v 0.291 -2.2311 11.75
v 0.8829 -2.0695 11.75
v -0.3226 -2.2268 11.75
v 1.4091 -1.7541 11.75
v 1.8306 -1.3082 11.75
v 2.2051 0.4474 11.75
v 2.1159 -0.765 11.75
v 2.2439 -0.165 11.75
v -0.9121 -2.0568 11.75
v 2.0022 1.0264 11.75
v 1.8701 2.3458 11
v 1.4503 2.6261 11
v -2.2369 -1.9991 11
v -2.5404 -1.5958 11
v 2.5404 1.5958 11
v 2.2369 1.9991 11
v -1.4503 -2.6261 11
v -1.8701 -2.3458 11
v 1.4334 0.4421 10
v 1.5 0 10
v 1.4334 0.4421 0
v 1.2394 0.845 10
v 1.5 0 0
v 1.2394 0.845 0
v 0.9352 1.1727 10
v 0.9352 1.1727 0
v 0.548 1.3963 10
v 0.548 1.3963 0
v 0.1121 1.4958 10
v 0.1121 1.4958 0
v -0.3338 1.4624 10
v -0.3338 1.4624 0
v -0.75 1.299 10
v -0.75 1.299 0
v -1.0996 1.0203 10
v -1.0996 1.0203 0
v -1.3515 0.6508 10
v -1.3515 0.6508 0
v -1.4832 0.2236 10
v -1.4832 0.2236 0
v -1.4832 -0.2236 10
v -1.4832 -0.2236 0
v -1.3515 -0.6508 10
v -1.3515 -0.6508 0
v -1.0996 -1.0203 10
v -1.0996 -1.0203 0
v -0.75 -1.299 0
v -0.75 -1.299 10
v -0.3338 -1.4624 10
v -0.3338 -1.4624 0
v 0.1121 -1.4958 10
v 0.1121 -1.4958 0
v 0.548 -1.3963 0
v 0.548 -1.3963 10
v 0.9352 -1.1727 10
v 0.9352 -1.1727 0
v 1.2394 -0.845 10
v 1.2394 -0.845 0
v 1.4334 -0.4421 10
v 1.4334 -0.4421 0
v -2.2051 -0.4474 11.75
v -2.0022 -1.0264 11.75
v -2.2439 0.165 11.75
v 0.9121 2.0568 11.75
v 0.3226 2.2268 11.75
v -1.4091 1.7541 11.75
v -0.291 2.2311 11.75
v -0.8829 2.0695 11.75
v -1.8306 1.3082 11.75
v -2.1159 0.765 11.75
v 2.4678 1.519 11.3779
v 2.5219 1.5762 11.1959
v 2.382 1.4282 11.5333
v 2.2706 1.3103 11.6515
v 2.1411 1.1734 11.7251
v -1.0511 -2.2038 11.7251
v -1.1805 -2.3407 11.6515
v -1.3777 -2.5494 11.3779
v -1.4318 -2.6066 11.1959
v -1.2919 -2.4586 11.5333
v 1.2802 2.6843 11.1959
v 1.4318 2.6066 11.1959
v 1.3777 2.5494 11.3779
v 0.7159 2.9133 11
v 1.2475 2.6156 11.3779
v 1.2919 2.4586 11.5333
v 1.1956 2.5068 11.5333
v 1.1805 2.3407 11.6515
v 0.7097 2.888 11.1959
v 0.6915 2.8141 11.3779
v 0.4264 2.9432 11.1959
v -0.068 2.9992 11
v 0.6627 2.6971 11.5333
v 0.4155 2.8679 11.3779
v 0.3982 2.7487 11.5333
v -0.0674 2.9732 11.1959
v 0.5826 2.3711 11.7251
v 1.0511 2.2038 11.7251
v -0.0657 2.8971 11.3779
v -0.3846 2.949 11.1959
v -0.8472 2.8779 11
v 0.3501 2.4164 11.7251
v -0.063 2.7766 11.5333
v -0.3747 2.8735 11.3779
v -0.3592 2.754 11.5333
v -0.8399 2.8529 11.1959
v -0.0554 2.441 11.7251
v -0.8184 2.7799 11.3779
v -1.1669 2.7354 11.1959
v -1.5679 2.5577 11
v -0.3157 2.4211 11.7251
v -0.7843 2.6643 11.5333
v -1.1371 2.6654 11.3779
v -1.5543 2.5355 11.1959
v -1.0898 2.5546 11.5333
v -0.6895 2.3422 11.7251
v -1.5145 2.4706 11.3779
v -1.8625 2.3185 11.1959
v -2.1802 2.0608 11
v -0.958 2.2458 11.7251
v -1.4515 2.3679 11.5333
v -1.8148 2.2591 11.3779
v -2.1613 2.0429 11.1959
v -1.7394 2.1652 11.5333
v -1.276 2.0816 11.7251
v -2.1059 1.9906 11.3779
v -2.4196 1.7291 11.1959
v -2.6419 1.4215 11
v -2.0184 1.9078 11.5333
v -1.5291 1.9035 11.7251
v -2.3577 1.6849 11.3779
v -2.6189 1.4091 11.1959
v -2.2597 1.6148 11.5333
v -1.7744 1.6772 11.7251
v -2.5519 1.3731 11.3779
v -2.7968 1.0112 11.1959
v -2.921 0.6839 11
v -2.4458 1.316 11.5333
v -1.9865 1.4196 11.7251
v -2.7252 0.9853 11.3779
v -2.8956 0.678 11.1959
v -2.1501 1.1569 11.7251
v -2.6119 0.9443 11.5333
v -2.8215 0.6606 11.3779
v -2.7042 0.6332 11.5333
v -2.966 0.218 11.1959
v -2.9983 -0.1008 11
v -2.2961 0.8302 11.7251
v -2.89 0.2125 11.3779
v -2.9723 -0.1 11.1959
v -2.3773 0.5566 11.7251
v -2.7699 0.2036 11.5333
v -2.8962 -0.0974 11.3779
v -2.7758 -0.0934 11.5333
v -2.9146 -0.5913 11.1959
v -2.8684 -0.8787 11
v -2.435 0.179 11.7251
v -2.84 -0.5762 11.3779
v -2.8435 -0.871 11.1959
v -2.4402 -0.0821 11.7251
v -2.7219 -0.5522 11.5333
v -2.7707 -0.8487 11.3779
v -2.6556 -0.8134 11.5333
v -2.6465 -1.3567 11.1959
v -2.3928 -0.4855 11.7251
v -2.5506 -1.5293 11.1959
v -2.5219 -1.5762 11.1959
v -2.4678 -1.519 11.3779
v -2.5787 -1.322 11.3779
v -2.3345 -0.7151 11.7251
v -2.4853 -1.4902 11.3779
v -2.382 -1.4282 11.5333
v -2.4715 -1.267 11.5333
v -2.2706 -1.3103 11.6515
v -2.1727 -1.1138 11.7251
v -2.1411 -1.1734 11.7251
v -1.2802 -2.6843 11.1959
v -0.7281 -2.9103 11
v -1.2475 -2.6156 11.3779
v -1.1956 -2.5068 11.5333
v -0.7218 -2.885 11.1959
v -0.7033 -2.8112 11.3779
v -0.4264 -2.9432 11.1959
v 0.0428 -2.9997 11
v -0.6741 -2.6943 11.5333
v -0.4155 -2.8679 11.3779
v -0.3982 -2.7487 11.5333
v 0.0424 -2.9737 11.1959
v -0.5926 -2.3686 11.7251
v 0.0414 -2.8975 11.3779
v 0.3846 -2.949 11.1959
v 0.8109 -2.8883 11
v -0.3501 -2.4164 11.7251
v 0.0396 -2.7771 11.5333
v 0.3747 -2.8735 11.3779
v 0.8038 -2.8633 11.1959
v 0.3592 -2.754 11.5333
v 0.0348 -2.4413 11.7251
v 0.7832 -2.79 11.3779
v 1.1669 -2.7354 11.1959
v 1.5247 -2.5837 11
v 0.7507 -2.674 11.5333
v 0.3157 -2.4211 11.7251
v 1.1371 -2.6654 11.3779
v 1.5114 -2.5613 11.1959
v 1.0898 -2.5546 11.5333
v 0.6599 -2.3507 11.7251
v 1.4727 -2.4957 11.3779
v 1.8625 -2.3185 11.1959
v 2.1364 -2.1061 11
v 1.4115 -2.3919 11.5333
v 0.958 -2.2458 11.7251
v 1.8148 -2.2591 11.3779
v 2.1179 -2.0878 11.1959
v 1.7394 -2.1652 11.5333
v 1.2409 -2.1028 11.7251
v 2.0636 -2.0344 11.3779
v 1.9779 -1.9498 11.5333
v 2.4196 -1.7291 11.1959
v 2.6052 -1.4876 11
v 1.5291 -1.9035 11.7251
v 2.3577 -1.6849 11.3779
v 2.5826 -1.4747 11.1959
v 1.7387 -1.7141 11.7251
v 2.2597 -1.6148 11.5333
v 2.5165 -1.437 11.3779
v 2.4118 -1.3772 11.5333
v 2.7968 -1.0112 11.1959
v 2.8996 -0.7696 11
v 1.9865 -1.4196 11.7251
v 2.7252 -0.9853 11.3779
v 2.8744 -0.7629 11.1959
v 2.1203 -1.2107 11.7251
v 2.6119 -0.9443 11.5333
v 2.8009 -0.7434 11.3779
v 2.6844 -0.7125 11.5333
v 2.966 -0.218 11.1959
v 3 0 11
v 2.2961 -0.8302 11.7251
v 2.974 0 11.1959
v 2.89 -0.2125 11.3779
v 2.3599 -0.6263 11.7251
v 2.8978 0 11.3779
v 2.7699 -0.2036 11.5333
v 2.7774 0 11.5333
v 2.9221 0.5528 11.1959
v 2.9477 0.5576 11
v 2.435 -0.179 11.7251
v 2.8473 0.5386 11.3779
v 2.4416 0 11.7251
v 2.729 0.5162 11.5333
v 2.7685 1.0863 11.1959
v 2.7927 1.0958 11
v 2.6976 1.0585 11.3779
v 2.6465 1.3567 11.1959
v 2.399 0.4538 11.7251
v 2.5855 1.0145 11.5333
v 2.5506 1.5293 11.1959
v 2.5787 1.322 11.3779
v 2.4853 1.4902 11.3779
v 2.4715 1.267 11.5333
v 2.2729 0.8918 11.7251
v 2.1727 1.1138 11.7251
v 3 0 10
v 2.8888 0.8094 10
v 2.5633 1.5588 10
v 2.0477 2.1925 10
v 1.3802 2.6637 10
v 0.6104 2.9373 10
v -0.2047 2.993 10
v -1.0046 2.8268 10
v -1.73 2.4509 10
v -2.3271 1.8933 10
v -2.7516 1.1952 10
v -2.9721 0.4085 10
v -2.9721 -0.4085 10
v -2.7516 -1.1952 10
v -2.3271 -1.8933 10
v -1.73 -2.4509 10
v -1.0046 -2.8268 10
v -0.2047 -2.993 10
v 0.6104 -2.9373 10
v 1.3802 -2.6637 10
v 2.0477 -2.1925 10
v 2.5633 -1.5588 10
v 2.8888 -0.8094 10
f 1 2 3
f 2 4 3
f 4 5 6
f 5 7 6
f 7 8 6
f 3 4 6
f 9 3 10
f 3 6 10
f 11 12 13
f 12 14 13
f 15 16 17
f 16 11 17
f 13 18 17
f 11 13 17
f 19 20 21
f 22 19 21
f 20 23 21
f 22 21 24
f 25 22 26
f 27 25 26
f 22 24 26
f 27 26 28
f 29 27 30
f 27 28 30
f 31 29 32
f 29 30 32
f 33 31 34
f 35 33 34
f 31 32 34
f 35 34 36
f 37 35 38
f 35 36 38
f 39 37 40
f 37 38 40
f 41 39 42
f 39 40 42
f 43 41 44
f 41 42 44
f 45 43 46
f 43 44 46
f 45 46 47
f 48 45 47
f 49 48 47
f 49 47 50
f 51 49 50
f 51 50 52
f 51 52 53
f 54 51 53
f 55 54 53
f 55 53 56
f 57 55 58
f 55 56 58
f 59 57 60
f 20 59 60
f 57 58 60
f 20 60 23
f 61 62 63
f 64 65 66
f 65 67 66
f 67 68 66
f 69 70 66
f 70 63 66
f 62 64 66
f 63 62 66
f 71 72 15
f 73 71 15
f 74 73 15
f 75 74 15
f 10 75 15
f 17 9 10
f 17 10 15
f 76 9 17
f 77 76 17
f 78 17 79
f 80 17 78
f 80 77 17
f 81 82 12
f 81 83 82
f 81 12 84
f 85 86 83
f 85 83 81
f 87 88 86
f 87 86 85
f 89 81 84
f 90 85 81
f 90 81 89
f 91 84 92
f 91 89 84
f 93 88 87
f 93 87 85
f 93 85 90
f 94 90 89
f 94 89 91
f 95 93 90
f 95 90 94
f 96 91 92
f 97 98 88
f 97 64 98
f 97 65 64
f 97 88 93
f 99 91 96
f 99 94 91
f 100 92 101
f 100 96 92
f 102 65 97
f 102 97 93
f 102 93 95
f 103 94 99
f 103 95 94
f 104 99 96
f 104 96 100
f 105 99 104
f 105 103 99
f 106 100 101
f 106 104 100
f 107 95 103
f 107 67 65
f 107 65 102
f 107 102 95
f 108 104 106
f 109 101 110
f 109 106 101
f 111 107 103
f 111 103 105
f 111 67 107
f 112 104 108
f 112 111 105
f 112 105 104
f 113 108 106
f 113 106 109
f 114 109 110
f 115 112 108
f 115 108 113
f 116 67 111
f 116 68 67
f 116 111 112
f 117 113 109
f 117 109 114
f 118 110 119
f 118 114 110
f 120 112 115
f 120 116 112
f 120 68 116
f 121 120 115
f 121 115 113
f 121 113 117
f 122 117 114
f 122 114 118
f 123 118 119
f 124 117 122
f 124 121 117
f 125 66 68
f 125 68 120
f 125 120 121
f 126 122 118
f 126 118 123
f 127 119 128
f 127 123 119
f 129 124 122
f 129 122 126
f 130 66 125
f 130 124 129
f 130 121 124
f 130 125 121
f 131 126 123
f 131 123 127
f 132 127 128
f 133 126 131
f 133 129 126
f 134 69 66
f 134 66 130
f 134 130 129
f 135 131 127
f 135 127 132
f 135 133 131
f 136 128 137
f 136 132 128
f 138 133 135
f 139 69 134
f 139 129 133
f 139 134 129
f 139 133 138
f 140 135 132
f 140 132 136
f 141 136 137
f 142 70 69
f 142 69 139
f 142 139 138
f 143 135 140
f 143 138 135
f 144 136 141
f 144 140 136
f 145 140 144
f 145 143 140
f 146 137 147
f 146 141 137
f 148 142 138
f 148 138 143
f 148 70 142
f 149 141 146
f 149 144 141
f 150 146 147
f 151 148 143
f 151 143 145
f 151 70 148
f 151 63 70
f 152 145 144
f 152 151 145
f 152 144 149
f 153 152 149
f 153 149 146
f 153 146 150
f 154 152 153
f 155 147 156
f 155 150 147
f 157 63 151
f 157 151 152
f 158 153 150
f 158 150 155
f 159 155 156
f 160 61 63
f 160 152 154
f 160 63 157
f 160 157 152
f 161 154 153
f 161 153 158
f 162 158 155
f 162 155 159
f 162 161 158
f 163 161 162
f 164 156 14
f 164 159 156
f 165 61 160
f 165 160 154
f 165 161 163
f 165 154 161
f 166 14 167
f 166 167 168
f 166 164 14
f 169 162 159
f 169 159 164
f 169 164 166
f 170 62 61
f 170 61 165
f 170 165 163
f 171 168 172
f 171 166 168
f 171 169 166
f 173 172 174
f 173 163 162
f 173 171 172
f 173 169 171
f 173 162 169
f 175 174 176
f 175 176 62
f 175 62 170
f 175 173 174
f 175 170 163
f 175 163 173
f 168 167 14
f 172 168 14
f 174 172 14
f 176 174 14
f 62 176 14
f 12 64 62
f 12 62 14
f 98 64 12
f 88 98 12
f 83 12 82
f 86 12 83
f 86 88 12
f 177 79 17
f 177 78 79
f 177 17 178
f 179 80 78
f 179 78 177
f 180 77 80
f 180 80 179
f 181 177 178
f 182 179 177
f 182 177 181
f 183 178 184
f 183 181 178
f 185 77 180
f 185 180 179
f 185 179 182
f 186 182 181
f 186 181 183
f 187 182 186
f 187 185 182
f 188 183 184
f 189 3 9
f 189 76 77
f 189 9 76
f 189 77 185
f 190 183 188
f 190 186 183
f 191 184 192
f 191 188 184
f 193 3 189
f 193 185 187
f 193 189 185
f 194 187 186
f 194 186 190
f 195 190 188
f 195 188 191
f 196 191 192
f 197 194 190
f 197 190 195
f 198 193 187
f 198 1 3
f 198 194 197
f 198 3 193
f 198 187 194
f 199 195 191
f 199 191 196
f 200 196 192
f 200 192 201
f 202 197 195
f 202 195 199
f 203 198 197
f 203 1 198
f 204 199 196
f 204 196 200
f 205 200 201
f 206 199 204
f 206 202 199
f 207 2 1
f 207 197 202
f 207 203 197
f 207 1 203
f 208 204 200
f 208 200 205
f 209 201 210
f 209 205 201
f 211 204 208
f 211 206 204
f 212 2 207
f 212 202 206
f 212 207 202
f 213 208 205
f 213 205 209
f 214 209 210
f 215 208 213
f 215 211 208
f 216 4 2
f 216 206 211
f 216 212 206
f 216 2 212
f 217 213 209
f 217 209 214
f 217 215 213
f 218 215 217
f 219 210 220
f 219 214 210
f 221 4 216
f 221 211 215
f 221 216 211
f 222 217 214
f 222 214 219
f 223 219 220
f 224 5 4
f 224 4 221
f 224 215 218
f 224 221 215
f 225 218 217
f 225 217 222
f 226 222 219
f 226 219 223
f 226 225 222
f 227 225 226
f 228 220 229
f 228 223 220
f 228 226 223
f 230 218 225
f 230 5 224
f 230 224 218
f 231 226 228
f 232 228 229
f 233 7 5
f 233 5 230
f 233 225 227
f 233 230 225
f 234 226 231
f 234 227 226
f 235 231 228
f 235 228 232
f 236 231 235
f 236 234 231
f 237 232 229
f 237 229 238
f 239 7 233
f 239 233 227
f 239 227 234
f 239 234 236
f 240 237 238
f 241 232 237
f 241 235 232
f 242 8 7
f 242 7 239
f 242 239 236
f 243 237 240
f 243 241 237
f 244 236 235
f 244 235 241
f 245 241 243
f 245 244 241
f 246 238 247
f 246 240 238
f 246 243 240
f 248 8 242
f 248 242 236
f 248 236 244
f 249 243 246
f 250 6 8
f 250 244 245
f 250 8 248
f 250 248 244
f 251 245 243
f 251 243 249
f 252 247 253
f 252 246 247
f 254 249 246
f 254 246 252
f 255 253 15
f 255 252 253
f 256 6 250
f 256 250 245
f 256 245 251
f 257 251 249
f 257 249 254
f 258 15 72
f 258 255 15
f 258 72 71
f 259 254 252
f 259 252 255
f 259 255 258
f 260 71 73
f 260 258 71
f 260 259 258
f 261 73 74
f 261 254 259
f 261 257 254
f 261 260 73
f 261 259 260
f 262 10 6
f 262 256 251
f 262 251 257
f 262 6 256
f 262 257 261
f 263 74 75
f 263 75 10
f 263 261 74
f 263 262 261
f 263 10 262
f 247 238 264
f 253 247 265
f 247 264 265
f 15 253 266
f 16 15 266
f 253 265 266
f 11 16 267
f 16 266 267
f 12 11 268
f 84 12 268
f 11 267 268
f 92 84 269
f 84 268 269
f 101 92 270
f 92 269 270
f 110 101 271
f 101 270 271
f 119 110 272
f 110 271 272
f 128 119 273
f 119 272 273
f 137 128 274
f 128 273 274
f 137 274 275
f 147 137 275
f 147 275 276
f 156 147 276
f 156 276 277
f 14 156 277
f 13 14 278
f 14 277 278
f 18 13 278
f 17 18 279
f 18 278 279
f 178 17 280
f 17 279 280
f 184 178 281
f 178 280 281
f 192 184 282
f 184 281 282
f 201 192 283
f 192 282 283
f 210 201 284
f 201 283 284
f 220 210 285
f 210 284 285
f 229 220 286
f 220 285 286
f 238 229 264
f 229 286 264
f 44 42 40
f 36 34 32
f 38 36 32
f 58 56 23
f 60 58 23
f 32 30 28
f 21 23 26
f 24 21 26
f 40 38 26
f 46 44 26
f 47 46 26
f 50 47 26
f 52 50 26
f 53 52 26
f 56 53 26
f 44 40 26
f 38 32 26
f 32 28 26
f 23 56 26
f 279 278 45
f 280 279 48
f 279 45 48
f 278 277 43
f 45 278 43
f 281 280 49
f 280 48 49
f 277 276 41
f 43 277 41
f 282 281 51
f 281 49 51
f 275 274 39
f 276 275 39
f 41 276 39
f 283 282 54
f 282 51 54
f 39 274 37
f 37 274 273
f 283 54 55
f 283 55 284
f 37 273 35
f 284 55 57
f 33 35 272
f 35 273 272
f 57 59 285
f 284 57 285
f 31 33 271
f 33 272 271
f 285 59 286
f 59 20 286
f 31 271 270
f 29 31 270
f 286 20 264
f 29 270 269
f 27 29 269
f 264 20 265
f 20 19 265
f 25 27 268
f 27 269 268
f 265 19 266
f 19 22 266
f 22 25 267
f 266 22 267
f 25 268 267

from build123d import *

# Parameters (mm, degrees)
POCKET_DEPTH = 0.75


with BuildPart() as part:
    # Sketch → Revolution (revolve)
    with BuildSketch(Plane.XZ):
        with BuildLine():
            Line((0, 0), (0, 11.75))
            Line((0, 11.75), (2.25, 11.75))
            ThreePointArc((3, 11), (2.78033, 11.53033), (2.25, 11.75))
            Line((3, 11), (3, 10))
            Line((3, 10), (1.5, 10))
            Line((1.5, 10), (1.5, 0))
            Line((1.5, 0), (0, 0))
        make_face()
    revolve(axis=Axis((0, 0, 0), (0, 0, 1)))

    # Sketch001 (on Face5 of Revolution) → Pocket (cut)
    with BuildSketch(Plane(origin=(0, 0, 11.75), x_dir=(-1, 0, 0), z_dir=(0, 0, 1))):
        Polygon((-3.274783, -2.372712), (2.184691, 3.4031), (3.274783, 2.372712), (-2.184691, -3.4031), align=None)
    extrude(amount=-POCKET_DEPTH, mode=Mode.SUBTRACT)


solid = part.part
